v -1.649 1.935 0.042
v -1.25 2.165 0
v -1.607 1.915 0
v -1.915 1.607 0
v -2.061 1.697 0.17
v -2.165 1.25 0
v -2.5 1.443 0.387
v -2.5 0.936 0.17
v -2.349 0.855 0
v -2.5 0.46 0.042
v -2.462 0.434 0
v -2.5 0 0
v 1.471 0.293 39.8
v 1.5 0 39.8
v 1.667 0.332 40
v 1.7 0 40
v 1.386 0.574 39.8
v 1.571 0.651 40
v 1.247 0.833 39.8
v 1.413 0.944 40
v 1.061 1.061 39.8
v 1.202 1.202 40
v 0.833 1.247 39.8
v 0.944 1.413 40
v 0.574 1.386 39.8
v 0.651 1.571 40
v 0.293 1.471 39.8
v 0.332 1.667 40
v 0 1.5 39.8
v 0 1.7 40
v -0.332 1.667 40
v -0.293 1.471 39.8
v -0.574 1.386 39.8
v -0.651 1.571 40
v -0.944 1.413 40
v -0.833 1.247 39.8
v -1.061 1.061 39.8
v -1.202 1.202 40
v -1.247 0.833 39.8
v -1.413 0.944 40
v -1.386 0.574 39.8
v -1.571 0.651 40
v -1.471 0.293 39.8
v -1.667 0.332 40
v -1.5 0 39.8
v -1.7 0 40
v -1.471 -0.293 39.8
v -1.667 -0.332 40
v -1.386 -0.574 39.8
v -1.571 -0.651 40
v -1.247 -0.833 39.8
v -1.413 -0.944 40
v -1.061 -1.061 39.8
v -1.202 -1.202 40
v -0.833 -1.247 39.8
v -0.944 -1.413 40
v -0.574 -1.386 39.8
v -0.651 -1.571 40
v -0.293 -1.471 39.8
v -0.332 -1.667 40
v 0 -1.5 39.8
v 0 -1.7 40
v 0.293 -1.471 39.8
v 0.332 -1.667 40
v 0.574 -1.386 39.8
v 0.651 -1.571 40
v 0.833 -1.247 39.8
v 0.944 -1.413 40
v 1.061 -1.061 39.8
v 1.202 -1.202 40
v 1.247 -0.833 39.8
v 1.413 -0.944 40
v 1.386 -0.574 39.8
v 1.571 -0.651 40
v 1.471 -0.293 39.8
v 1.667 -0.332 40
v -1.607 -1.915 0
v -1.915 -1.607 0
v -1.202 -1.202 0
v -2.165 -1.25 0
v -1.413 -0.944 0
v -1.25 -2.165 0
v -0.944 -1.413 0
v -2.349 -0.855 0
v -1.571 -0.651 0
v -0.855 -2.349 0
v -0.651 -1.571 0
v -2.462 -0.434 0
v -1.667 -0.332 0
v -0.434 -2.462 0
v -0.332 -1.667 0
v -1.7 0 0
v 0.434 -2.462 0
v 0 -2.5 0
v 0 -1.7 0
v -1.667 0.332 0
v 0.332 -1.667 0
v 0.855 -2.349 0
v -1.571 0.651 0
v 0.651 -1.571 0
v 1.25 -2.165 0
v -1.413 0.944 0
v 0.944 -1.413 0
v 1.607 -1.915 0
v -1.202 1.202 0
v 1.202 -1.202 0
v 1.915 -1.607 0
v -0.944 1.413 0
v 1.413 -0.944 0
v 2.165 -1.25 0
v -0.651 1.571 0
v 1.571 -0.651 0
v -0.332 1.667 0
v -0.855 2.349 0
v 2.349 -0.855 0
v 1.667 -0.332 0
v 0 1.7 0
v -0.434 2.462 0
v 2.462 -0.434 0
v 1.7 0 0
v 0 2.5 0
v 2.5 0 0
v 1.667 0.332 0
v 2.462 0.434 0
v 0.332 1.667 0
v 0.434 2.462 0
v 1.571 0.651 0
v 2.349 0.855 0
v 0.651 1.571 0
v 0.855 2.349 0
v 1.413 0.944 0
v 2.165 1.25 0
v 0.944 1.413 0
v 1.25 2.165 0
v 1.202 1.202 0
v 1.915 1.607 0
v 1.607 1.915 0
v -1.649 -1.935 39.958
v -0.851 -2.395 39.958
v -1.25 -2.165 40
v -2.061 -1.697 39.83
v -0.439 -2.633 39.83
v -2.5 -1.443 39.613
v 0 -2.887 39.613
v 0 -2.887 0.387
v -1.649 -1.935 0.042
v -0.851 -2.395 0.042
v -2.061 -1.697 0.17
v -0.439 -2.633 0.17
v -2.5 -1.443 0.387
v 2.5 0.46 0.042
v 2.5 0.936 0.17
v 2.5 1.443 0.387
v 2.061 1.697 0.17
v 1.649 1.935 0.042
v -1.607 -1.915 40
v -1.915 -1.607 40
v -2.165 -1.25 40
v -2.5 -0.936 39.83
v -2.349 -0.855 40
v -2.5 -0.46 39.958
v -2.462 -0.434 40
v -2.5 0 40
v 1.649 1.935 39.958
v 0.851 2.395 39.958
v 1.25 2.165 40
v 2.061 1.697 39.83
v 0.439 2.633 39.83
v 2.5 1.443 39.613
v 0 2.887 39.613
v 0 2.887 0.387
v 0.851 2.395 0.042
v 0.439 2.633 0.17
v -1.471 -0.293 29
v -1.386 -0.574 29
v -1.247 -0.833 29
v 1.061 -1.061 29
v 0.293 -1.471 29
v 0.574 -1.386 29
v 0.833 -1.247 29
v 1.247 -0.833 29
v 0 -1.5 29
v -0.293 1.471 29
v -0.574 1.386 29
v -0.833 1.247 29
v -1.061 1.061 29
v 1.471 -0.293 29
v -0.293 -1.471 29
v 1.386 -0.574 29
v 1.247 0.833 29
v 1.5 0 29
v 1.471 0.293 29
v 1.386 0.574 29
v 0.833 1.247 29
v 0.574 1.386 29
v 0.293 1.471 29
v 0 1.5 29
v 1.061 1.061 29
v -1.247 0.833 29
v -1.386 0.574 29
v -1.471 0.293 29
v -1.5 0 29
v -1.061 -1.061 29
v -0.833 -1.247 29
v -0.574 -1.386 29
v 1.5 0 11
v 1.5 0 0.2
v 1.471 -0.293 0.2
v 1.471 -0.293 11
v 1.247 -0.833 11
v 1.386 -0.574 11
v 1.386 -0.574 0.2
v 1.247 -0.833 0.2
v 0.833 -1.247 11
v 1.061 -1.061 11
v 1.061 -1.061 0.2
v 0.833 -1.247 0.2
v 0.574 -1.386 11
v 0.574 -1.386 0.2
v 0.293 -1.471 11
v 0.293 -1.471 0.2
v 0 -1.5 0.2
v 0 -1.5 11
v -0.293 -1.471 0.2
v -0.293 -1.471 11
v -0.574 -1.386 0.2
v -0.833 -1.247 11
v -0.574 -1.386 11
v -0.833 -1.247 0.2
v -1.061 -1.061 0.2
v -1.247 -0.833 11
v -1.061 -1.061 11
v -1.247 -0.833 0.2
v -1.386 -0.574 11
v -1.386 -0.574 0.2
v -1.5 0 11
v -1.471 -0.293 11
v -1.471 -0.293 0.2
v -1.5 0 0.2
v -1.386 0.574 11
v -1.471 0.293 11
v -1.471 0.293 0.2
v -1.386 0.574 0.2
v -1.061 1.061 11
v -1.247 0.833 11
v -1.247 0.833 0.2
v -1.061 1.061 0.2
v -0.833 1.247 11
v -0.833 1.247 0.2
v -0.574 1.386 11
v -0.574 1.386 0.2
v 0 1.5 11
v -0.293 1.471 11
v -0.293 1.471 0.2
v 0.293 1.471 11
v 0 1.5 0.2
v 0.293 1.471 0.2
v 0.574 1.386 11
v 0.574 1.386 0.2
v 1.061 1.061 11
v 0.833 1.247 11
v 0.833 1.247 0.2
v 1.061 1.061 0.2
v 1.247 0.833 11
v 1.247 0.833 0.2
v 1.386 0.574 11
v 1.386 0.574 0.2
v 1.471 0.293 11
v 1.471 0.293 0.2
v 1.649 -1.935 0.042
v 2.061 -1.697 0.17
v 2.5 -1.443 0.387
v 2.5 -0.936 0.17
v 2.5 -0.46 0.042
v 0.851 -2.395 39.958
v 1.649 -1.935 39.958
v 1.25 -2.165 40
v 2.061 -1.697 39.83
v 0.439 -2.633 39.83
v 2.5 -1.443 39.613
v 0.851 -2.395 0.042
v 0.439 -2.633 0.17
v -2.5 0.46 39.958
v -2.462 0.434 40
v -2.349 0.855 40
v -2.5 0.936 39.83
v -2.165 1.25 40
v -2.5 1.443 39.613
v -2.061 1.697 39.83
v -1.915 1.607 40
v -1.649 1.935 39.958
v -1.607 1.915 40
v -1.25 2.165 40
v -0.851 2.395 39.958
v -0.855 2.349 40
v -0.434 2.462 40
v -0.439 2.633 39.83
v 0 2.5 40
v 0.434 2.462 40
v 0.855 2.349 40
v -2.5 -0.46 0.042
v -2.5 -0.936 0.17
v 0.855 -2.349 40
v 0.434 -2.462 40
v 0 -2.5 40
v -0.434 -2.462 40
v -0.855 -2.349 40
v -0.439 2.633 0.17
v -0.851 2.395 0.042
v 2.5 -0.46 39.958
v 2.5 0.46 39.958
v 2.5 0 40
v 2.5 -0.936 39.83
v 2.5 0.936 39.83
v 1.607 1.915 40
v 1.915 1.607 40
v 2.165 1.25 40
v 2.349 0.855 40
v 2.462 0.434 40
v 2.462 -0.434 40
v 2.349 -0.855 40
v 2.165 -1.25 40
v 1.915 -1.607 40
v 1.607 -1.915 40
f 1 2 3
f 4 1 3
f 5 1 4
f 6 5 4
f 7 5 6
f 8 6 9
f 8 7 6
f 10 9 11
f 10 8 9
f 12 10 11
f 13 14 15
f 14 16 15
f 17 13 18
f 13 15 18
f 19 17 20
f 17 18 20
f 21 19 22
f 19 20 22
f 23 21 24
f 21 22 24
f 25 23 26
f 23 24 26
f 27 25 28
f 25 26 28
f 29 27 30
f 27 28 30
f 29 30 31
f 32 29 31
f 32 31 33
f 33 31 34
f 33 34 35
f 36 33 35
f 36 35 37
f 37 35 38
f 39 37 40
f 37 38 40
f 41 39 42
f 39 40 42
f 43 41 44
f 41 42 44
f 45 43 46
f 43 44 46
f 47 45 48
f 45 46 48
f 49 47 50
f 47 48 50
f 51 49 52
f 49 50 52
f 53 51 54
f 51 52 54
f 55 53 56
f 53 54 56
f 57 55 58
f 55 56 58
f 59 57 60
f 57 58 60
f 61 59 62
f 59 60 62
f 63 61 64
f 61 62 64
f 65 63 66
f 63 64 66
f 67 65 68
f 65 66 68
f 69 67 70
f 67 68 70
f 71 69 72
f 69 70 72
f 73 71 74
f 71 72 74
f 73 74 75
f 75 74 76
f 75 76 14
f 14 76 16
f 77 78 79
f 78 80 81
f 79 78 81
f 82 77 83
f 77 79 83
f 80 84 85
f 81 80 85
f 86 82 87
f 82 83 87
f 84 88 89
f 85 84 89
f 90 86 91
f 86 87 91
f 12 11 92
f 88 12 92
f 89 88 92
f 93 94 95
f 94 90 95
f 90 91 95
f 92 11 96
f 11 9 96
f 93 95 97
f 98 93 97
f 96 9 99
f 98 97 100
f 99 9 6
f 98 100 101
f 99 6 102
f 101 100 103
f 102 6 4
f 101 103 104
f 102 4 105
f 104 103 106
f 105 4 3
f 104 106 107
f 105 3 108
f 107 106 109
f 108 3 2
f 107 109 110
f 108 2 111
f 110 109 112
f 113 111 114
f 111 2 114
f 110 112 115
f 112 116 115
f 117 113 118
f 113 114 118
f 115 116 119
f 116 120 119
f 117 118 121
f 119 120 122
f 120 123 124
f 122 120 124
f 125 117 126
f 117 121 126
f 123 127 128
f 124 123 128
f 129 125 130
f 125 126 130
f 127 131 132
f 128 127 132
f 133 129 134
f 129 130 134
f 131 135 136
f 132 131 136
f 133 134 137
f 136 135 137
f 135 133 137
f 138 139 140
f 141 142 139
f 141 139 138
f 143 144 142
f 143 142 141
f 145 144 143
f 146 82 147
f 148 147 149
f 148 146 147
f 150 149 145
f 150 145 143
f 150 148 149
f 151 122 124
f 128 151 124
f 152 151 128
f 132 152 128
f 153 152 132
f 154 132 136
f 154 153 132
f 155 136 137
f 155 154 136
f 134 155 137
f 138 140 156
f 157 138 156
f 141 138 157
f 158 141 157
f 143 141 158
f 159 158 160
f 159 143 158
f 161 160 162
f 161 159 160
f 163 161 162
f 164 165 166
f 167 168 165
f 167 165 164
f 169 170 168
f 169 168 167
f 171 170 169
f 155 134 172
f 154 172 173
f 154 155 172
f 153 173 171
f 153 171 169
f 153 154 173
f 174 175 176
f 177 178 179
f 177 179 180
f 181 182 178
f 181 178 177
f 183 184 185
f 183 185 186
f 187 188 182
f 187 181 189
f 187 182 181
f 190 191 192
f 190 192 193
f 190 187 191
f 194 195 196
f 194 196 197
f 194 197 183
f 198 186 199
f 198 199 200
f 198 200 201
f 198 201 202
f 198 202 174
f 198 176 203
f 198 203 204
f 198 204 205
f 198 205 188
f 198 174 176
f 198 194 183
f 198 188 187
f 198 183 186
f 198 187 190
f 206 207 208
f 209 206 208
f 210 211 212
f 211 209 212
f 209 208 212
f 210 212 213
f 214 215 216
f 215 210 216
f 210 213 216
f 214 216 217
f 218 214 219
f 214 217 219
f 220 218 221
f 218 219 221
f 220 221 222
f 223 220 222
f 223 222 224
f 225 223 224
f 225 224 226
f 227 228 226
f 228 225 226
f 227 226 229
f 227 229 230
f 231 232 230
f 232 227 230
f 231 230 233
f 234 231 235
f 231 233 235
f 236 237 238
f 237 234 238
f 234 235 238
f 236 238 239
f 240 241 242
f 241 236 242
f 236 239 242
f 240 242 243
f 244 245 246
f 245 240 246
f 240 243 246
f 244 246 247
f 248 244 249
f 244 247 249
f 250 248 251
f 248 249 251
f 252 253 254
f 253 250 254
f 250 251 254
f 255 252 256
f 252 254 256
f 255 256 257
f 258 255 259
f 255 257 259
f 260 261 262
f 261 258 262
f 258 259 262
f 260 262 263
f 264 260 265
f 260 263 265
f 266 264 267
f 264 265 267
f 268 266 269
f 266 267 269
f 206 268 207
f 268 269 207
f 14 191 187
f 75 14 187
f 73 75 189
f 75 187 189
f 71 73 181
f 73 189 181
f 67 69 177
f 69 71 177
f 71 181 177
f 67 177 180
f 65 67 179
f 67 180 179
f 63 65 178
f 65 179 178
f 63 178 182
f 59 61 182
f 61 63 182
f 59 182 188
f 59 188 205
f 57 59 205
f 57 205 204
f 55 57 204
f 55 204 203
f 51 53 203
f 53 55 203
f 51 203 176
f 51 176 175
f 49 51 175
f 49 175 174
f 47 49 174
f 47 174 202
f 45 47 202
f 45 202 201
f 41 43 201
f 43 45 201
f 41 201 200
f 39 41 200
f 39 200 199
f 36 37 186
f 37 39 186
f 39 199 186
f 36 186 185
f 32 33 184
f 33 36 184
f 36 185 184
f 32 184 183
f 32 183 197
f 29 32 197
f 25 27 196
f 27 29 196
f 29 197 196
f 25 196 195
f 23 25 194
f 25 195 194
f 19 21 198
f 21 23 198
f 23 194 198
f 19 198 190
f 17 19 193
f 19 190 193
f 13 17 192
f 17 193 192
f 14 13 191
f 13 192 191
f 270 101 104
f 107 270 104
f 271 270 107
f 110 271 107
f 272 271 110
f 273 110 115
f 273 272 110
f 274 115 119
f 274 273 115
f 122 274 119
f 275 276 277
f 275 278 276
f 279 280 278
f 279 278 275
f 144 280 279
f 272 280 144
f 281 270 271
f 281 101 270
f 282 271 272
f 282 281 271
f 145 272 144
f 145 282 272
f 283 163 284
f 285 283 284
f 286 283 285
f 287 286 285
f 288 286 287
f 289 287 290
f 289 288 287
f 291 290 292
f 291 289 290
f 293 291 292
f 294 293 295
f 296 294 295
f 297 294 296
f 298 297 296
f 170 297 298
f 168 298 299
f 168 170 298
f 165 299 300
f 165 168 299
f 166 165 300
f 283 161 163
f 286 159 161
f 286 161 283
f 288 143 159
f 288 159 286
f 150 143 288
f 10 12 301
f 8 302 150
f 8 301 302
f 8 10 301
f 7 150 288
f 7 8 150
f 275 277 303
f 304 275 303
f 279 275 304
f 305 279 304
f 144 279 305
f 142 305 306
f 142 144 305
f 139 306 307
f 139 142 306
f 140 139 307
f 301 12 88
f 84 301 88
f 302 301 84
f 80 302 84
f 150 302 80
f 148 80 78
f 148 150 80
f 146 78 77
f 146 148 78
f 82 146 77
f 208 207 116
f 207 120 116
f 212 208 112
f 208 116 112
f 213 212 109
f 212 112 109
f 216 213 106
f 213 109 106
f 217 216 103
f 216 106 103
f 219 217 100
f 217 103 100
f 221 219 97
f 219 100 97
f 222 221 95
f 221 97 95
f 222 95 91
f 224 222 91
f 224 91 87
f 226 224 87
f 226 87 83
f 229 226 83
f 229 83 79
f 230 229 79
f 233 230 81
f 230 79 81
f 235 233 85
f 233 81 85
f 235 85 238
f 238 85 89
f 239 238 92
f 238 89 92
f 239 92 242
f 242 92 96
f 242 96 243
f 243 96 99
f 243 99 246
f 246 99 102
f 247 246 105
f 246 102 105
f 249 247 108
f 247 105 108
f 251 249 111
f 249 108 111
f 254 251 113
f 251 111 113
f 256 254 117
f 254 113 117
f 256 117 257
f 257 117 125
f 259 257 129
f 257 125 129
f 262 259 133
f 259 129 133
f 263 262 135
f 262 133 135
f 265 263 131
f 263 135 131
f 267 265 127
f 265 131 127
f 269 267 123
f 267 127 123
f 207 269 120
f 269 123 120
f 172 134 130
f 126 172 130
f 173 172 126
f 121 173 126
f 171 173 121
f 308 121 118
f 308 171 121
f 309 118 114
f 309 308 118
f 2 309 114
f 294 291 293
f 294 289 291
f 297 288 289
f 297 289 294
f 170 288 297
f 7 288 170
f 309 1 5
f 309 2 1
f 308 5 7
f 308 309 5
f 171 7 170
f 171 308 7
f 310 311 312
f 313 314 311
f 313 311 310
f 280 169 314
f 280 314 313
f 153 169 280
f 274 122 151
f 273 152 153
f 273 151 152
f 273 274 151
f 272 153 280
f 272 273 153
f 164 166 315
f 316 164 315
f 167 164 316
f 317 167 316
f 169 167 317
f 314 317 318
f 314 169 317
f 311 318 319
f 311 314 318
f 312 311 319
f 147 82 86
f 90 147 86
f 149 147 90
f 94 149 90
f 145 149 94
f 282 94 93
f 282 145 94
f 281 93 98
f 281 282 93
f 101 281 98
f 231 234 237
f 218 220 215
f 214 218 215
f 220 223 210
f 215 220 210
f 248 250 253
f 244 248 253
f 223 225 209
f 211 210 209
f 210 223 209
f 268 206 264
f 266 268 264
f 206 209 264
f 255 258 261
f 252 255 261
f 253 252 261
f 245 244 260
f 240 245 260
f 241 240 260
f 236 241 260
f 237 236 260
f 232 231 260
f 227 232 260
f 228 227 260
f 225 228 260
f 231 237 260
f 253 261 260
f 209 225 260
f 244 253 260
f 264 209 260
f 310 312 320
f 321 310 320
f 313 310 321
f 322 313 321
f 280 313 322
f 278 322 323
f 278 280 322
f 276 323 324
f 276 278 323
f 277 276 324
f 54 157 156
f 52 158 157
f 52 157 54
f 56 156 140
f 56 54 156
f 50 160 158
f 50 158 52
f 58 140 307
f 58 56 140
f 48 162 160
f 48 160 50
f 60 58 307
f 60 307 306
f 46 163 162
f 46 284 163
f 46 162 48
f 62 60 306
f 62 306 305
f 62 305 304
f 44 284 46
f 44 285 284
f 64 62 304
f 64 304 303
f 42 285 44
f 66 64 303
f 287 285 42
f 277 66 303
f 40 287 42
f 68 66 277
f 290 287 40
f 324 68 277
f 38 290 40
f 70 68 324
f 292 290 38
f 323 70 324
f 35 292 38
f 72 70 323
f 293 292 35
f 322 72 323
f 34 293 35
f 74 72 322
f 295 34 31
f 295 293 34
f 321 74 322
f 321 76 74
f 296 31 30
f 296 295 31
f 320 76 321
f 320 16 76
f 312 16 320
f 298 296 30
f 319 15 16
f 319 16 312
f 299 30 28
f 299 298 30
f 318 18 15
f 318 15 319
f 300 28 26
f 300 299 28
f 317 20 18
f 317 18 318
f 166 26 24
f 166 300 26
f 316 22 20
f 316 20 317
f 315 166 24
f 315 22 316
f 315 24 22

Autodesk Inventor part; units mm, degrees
ref_plane "YZ Plane" through (0, 0, 0) normal (1, 0, 0) x (0, 1, 0)
ref_plane "XZ Plane" through (0, 0, 0) normal (0, 1, 0) x (-1, 0, 0)
sketch "Náčrt1" plane through (0, 0, 0) normal (0, 0, 1) x (1, 0, 0)
  line L0 (2.5, -1.4434) -> (0, -2.8868)
  line L1 (0, -2.8868) -> (-2.5, -1.4434)
  line L2 (-2.5, -1.4434) -> (-2.5, 1.4434)
  line L3 (-2.5, 1.4434) -> (0, 2.8868)
  line L4 (0, 2.8868) -> (2.5, 1.4434)
  line L5 (2.5, 1.4434) -> (2.5, -1.4434)
  circle A0 centre (0, 0) radius 1.5
  point P0 (2.5, 0)
  dimension "d1" = 3
  dimension "d16" = 5
extrude "Vysunutí1" add sketch "Náčrt1" along normal blind 40
thread "Závit1" size "M3x0.5" class "6H" standard "ANSI Metric M Profile" full length
sketch "Náčrt2" plane through (0, 0, 40) normal (0, 0, 1) x (1, 0, 0)
  circle A0 centre (0, 0) radius 2.5
  dimension "d18" = 5
extrude "Vysunutí2" cut sketch "Náčrt2" against normal through all draft 45 keep common part
sketch "Náčrt3" plane through (0, 0, 0) normal (0, 0, -1) x (-1, 0, 0)
  circle A0 centre (0, 0) radius 2.5
  dimension "d17" = 5
extrude "Vysunutí3" cut sketch "Náčrt3" against normal through all draft 45 keep common part
chamfer "Zkosení1" distance 0.2 angle 45 1 edges at (-1.5, 0, 40)
chamfer "Zkosení2" distance 0.2 angle 45 1 edges at (-1.5, 0, 0)
ref_plane "Pracovní rovina1" through (0, 0, 20) normal (0, 0, 1) x (1, 0, 0)
sketch "Náčrt4" plane through (0, 0, 20) normal (0, 0, 1) x (1, 0, 0)
  point P0 (0, 0)
sketch "Náčrt5" plane through (0, 0, 20) normal (0, 0, 1) x (1, 0, 0)
  circle A0 centre (0, 0) radius 1.5
  dimension "d19" = 3
extrude "Vysunutí4" add sketch "Náčrt5" along normal mid plane 18
properties part number "PillarBolt-M3x40" material "Ocel, vysokopevnostní, nízkolegovaná"
